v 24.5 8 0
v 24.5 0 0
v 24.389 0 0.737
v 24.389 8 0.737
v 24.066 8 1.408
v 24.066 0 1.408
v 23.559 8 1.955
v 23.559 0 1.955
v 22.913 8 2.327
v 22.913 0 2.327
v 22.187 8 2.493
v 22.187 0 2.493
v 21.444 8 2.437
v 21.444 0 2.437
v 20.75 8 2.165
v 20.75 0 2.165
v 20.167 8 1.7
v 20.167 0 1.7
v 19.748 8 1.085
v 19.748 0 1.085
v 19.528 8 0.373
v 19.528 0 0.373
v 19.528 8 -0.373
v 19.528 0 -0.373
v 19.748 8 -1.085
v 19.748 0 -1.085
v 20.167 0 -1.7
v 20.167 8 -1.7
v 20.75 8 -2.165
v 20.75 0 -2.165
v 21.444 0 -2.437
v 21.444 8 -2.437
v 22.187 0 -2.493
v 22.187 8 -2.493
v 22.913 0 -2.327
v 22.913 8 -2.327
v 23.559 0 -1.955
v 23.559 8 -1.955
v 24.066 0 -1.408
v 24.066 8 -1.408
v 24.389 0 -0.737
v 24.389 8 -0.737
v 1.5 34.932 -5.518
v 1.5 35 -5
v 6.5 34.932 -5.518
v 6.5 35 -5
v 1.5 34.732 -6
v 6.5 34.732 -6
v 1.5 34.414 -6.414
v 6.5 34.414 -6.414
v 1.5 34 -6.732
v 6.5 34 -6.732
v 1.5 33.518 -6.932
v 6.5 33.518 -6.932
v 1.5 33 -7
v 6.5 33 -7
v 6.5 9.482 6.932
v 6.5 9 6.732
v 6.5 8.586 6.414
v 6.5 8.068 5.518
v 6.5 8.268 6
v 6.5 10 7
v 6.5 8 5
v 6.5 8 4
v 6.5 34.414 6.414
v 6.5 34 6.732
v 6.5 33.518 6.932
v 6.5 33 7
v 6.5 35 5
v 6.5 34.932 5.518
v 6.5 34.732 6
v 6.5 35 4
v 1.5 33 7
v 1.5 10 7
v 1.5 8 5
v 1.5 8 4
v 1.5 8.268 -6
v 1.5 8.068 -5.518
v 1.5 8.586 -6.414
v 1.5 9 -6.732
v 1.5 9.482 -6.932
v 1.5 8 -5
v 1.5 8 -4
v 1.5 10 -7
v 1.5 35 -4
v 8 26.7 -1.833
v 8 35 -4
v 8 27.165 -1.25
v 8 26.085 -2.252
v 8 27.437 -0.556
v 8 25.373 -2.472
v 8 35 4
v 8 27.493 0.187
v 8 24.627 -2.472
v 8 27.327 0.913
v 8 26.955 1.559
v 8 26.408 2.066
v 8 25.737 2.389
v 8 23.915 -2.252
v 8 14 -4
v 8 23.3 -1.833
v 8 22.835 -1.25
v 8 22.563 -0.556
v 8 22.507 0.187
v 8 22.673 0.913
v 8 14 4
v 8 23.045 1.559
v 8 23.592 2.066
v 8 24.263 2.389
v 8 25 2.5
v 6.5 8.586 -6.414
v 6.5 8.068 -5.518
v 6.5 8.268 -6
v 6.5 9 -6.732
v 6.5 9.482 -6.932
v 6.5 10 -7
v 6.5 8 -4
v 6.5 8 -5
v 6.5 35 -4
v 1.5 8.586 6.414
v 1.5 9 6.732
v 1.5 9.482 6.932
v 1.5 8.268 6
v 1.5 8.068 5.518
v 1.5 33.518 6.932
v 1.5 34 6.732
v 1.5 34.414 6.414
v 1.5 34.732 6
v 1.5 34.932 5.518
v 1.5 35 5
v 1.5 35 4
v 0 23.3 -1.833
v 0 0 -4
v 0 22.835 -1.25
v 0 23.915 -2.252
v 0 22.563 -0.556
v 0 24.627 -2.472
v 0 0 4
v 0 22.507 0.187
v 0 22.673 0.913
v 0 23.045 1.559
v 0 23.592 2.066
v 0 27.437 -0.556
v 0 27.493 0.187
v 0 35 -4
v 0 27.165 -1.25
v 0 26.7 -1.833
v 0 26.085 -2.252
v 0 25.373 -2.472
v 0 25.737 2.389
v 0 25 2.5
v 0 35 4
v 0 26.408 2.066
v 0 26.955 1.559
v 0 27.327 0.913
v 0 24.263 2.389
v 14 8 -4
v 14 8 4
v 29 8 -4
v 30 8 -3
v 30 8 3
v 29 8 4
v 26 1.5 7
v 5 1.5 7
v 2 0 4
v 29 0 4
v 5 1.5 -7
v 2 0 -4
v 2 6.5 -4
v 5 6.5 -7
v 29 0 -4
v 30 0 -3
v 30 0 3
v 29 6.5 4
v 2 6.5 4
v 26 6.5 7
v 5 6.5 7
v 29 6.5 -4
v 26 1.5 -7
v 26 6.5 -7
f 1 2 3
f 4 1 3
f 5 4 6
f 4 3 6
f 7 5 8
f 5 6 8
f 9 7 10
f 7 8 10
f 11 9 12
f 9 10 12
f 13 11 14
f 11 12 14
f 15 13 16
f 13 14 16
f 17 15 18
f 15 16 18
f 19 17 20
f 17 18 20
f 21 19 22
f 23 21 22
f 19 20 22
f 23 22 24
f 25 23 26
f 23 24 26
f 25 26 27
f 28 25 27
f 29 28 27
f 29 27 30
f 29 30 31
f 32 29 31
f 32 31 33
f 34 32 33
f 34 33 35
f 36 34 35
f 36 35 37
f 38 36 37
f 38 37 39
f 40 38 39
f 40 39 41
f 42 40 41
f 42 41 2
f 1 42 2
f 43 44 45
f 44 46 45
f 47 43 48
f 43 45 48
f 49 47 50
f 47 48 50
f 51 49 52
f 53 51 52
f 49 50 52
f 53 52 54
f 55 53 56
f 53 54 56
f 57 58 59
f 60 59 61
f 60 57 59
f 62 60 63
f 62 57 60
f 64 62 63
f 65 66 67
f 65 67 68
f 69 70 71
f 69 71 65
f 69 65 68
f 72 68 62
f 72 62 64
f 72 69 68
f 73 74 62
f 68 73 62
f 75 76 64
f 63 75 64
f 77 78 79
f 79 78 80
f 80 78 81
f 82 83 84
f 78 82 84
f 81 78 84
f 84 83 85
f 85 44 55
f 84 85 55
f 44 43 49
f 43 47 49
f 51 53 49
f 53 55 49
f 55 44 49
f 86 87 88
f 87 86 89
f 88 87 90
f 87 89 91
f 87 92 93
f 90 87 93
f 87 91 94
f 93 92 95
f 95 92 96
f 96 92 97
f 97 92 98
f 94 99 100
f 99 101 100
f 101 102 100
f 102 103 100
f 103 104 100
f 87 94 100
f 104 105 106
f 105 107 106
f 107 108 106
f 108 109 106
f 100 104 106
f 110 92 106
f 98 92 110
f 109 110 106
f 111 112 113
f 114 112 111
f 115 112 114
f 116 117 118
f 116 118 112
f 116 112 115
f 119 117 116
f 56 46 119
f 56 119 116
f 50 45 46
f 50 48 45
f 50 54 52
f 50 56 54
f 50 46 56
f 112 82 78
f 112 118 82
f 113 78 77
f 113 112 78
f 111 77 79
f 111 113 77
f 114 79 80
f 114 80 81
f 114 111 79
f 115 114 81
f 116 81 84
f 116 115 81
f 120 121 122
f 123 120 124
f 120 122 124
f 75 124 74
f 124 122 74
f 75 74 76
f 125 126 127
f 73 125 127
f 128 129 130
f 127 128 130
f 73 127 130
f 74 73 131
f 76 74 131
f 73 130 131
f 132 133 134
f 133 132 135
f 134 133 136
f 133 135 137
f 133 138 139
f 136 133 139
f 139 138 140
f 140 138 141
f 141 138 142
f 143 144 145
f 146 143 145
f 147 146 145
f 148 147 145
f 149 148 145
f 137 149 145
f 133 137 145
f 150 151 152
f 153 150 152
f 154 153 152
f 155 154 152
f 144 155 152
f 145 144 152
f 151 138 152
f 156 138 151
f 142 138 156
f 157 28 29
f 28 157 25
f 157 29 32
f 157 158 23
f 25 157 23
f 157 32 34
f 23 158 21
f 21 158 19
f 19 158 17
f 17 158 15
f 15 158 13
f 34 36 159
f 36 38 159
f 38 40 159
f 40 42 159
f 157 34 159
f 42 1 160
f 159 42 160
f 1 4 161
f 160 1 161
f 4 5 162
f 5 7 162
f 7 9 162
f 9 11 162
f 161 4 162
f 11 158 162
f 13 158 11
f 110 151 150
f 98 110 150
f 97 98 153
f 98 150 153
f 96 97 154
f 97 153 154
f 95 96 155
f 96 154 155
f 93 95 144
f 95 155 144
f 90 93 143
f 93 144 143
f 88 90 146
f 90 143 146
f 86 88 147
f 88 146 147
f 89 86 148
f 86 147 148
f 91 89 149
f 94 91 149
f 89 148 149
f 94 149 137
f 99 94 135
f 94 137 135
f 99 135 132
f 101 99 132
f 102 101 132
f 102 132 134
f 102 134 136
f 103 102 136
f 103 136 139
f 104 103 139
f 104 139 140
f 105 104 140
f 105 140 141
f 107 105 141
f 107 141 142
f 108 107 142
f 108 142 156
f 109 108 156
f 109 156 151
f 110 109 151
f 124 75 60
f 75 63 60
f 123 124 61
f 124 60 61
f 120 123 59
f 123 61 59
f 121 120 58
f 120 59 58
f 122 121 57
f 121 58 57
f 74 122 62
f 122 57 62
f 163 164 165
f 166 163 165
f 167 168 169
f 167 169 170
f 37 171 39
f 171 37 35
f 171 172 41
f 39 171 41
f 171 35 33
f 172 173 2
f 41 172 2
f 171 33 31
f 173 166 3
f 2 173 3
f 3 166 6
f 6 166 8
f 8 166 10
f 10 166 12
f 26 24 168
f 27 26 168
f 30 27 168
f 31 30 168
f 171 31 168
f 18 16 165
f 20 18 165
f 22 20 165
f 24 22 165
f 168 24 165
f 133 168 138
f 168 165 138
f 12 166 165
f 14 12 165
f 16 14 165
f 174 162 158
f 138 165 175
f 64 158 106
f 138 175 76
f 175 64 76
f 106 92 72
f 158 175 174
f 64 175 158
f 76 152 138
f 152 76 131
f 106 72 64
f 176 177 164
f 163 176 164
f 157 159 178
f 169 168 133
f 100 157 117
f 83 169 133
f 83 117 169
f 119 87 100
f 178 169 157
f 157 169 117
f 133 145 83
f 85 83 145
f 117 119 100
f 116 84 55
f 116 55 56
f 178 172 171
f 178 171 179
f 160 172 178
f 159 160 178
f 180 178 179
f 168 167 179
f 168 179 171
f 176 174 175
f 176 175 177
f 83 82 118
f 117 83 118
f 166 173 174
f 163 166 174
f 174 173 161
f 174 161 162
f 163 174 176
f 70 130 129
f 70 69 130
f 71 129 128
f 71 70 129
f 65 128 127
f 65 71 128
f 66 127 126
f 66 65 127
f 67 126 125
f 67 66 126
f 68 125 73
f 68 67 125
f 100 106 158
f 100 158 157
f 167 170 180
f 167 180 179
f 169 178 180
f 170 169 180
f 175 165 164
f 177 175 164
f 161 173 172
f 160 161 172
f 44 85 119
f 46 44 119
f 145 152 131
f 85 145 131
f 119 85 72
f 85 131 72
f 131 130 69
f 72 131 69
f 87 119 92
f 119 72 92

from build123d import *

# Parameters (mm, degrees)
BOSS_EXTRUDE1_DEPTH = 4
BOSS_EXTRUDE2_DEPTH = 29
CHAMFER1_SIZE       = 4
CHAMFER2_SIZE       = 6
CUT_EXTRUDE1_REACH  = 48.626
SKETCH3_R           = 2.5
CUT_EXTRUDE2_REACH  = 48.626
SKETCH4_R           = 2.5
SKETCH5_W           = 5
SKETCH5_H           = 3
BOSS_EXTRUDE3_DEPTH = 27
FILLET1_R           = 2


with BuildPart() as part:
    # Sketch1 → Boss-Extrude1 (new, symmetric)
    with BuildSketch(Plane.XY):
        Polygon((0, 0), (0, 35), (8, 35), (8, 8), (30, 8), (30, 0), align=None)
    extrude(amount=BOSS_EXTRUDE1_DEPTH, both=True)

    # Sketch2 → Boss-Extrude2 (add)
    with BuildSketch(Plane(origin=(30, 0, 0), x_dir=(0, 0, -1), z_dir=(1, 0, 0))):
        Polygon((-4, 6.5), (-7, 6.5), (-7, 1.5), (-4, 0), align=None)
        Polygon((4, 0), (4, 6.5), (7, 6.5), (7, 1.5), align=None)
    extrude(amount=-BOSS_EXTRUDE2_DEPTH)

    # Chamfer1
    # the kernel refuses this chamfer: 4 mm, written as the material it takes off along each edge
    with BuildSketch(Plane(origin=(30, 16.786731952, -7), x_dir=(0.027495876610586487, 0, 0.9996219169112968), z_dir=(0, -1, 0))) as chamfer1_piece_1:
        Polygon((CHAMFER1_SIZE * 0.999621916911, CHAMFER1_SIZE * 0.0274958766106), (-CHAMFER1_SIZE * 0.0274958766106, CHAMFER1_SIZE * 0.999621916911), (0, 0), align=None)
    extrude(amount=25.573463904, mode=Mode.SUBTRACT)
    with BuildSketch(Plane(origin=(1, 16.786731952, -7), x_dir=(-0.02749587661058638, 0, 0.9996219169112968), z_dir=(0, -1, 0))) as chamfer1_piece_2_section:
        Polygon((CHAMFER1_SIZE * 0.999621916911, -CHAMFER1_SIZE * 0.0274958766106), (-CHAMFER1_SIZE * 0.0274958766106, -CHAMFER1_SIZE * 0.999621916911), (0, 0), align=None)
    chamfer1_piece_2 = extrude(amount=25.573463904, mode=Mode.PRIVATE)
    chamfer1_piece_2 = split(chamfer1_piece_2, bisect_by=Plane(origin=(2.407836441, 4, -4), z_dir=(0, 0, -1)), keep=Keep.TOP, mode=Mode.PRIVATE)
    add(chamfer1_piece_2, mode=Mode.SUBTRACT)
    with BuildSketch(Plane(origin=(30, 16.786731952, 7), x_dir=(0.027495876610586487, 0, -0.9996219169112968), z_dir=(0, -1, 0))) as chamfer1_piece_3:
        Polygon((CHAMFER1_SIZE * 0.999621916911, -CHAMFER1_SIZE * 0.0274958766106), (-CHAMFER1_SIZE * 0.0274958766106, -CHAMFER1_SIZE * 0.999621916911), (0, 0), align=None)
    extrude(amount=25.573463904, mode=Mode.SUBTRACT)
    with BuildSketch(Plane(origin=(1, 16.786731952, 7), x_dir=(-0.02749587661058638, 0, -0.9996219169112968), z_dir=(0, -1, 0))) as chamfer1_piece_4_section:
        Polygon((CHAMFER1_SIZE * 0.999621916911, CHAMFER1_SIZE * 0.0274958766106), (-CHAMFER1_SIZE * 0.0274958766106, CHAMFER1_SIZE * 0.999621916911), (0, 0), align=None)
    chamfer1_piece_4 = extrude(amount=25.573463904, mode=Mode.PRIVATE)
    chamfer1_piece_4 = split(chamfer1_piece_4, bisect_by=Plane(origin=(2.407836441, 4, 4), z_dir=(0, 0, 1)), keep=Keep.TOP, mode=Mode.PRIVATE)
    add(chamfer1_piece_4, mode=Mode.SUBTRACT)

    # Chamfer2
    chamfer2_edges = [part.edges().sort_by_distance(p)[0] for p in [
        (8, 8, 0),
    ]]
    chamfer(chamfer2_edges, length=CHAMFER2_SIZE)

    # Sketch3 → Cut-Extrude1 (cut, up to next)
    with BuildSketch(Plane.XZ, mode=Mode.PRIVATE) as cut_extrude1_sk1:
        with Locations((22, 0)):
            Circle(SKETCH3_R)
    cut_extrude1_tool1 = extrude(cut_extrude1_sk1.sketch, amount=-CUT_EXTRUDE1_REACH, mode=Mode.PRIVATE) & part.part
    add(cut_extrude1_tool1.solids().sort_by_distance((22, 0, 0))[0], mode=Mode.SUBTRACT)

    # Sketch4 → Cut-Extrude2 (cut, up to next)
    with BuildSketch(Plane.ZY, mode=Mode.PRIVATE) as cut_extrude2_sk1:
        with Locations((0, 25)):
            Circle(SKETCH4_R)
    cut_extrude2_tool1 = extrude(cut_extrude2_sk1.sketch, amount=-CUT_EXTRUDE2_REACH, mode=Mode.PRIVATE) & part.part
    add(cut_extrude2_tool1.solids().sort_by_distance((0, 25, 0))[0], mode=Mode.SUBTRACT)

    # Sketch5 → Boss-Extrude3 (add)
    with BuildSketch(Plane(origin=(0, 35, 0), x_dir=(1, 0, 0), z_dir=(0, 1, 0))):
        with Locations((4, 5.5)):
            Rectangle(SKETCH5_W, SKETCH5_H)
        with Locations((4, -5.5)):
            Rectangle(SKETCH5_W, SKETCH5_H)
    extrude(amount=-BOSS_EXTRUDE3_DEPTH)

    # Fillet1
    fillet1_edges = [part.edges().sort_by_distance(p)[0] for p in [
        (4, 8, -7),
        (4, 35, -7),
        (4, 8, 7),
        (4, 35, 7),
    ]]
    fillet(fillet1_edges, radius=FILLET1_R)


solid = part.part
